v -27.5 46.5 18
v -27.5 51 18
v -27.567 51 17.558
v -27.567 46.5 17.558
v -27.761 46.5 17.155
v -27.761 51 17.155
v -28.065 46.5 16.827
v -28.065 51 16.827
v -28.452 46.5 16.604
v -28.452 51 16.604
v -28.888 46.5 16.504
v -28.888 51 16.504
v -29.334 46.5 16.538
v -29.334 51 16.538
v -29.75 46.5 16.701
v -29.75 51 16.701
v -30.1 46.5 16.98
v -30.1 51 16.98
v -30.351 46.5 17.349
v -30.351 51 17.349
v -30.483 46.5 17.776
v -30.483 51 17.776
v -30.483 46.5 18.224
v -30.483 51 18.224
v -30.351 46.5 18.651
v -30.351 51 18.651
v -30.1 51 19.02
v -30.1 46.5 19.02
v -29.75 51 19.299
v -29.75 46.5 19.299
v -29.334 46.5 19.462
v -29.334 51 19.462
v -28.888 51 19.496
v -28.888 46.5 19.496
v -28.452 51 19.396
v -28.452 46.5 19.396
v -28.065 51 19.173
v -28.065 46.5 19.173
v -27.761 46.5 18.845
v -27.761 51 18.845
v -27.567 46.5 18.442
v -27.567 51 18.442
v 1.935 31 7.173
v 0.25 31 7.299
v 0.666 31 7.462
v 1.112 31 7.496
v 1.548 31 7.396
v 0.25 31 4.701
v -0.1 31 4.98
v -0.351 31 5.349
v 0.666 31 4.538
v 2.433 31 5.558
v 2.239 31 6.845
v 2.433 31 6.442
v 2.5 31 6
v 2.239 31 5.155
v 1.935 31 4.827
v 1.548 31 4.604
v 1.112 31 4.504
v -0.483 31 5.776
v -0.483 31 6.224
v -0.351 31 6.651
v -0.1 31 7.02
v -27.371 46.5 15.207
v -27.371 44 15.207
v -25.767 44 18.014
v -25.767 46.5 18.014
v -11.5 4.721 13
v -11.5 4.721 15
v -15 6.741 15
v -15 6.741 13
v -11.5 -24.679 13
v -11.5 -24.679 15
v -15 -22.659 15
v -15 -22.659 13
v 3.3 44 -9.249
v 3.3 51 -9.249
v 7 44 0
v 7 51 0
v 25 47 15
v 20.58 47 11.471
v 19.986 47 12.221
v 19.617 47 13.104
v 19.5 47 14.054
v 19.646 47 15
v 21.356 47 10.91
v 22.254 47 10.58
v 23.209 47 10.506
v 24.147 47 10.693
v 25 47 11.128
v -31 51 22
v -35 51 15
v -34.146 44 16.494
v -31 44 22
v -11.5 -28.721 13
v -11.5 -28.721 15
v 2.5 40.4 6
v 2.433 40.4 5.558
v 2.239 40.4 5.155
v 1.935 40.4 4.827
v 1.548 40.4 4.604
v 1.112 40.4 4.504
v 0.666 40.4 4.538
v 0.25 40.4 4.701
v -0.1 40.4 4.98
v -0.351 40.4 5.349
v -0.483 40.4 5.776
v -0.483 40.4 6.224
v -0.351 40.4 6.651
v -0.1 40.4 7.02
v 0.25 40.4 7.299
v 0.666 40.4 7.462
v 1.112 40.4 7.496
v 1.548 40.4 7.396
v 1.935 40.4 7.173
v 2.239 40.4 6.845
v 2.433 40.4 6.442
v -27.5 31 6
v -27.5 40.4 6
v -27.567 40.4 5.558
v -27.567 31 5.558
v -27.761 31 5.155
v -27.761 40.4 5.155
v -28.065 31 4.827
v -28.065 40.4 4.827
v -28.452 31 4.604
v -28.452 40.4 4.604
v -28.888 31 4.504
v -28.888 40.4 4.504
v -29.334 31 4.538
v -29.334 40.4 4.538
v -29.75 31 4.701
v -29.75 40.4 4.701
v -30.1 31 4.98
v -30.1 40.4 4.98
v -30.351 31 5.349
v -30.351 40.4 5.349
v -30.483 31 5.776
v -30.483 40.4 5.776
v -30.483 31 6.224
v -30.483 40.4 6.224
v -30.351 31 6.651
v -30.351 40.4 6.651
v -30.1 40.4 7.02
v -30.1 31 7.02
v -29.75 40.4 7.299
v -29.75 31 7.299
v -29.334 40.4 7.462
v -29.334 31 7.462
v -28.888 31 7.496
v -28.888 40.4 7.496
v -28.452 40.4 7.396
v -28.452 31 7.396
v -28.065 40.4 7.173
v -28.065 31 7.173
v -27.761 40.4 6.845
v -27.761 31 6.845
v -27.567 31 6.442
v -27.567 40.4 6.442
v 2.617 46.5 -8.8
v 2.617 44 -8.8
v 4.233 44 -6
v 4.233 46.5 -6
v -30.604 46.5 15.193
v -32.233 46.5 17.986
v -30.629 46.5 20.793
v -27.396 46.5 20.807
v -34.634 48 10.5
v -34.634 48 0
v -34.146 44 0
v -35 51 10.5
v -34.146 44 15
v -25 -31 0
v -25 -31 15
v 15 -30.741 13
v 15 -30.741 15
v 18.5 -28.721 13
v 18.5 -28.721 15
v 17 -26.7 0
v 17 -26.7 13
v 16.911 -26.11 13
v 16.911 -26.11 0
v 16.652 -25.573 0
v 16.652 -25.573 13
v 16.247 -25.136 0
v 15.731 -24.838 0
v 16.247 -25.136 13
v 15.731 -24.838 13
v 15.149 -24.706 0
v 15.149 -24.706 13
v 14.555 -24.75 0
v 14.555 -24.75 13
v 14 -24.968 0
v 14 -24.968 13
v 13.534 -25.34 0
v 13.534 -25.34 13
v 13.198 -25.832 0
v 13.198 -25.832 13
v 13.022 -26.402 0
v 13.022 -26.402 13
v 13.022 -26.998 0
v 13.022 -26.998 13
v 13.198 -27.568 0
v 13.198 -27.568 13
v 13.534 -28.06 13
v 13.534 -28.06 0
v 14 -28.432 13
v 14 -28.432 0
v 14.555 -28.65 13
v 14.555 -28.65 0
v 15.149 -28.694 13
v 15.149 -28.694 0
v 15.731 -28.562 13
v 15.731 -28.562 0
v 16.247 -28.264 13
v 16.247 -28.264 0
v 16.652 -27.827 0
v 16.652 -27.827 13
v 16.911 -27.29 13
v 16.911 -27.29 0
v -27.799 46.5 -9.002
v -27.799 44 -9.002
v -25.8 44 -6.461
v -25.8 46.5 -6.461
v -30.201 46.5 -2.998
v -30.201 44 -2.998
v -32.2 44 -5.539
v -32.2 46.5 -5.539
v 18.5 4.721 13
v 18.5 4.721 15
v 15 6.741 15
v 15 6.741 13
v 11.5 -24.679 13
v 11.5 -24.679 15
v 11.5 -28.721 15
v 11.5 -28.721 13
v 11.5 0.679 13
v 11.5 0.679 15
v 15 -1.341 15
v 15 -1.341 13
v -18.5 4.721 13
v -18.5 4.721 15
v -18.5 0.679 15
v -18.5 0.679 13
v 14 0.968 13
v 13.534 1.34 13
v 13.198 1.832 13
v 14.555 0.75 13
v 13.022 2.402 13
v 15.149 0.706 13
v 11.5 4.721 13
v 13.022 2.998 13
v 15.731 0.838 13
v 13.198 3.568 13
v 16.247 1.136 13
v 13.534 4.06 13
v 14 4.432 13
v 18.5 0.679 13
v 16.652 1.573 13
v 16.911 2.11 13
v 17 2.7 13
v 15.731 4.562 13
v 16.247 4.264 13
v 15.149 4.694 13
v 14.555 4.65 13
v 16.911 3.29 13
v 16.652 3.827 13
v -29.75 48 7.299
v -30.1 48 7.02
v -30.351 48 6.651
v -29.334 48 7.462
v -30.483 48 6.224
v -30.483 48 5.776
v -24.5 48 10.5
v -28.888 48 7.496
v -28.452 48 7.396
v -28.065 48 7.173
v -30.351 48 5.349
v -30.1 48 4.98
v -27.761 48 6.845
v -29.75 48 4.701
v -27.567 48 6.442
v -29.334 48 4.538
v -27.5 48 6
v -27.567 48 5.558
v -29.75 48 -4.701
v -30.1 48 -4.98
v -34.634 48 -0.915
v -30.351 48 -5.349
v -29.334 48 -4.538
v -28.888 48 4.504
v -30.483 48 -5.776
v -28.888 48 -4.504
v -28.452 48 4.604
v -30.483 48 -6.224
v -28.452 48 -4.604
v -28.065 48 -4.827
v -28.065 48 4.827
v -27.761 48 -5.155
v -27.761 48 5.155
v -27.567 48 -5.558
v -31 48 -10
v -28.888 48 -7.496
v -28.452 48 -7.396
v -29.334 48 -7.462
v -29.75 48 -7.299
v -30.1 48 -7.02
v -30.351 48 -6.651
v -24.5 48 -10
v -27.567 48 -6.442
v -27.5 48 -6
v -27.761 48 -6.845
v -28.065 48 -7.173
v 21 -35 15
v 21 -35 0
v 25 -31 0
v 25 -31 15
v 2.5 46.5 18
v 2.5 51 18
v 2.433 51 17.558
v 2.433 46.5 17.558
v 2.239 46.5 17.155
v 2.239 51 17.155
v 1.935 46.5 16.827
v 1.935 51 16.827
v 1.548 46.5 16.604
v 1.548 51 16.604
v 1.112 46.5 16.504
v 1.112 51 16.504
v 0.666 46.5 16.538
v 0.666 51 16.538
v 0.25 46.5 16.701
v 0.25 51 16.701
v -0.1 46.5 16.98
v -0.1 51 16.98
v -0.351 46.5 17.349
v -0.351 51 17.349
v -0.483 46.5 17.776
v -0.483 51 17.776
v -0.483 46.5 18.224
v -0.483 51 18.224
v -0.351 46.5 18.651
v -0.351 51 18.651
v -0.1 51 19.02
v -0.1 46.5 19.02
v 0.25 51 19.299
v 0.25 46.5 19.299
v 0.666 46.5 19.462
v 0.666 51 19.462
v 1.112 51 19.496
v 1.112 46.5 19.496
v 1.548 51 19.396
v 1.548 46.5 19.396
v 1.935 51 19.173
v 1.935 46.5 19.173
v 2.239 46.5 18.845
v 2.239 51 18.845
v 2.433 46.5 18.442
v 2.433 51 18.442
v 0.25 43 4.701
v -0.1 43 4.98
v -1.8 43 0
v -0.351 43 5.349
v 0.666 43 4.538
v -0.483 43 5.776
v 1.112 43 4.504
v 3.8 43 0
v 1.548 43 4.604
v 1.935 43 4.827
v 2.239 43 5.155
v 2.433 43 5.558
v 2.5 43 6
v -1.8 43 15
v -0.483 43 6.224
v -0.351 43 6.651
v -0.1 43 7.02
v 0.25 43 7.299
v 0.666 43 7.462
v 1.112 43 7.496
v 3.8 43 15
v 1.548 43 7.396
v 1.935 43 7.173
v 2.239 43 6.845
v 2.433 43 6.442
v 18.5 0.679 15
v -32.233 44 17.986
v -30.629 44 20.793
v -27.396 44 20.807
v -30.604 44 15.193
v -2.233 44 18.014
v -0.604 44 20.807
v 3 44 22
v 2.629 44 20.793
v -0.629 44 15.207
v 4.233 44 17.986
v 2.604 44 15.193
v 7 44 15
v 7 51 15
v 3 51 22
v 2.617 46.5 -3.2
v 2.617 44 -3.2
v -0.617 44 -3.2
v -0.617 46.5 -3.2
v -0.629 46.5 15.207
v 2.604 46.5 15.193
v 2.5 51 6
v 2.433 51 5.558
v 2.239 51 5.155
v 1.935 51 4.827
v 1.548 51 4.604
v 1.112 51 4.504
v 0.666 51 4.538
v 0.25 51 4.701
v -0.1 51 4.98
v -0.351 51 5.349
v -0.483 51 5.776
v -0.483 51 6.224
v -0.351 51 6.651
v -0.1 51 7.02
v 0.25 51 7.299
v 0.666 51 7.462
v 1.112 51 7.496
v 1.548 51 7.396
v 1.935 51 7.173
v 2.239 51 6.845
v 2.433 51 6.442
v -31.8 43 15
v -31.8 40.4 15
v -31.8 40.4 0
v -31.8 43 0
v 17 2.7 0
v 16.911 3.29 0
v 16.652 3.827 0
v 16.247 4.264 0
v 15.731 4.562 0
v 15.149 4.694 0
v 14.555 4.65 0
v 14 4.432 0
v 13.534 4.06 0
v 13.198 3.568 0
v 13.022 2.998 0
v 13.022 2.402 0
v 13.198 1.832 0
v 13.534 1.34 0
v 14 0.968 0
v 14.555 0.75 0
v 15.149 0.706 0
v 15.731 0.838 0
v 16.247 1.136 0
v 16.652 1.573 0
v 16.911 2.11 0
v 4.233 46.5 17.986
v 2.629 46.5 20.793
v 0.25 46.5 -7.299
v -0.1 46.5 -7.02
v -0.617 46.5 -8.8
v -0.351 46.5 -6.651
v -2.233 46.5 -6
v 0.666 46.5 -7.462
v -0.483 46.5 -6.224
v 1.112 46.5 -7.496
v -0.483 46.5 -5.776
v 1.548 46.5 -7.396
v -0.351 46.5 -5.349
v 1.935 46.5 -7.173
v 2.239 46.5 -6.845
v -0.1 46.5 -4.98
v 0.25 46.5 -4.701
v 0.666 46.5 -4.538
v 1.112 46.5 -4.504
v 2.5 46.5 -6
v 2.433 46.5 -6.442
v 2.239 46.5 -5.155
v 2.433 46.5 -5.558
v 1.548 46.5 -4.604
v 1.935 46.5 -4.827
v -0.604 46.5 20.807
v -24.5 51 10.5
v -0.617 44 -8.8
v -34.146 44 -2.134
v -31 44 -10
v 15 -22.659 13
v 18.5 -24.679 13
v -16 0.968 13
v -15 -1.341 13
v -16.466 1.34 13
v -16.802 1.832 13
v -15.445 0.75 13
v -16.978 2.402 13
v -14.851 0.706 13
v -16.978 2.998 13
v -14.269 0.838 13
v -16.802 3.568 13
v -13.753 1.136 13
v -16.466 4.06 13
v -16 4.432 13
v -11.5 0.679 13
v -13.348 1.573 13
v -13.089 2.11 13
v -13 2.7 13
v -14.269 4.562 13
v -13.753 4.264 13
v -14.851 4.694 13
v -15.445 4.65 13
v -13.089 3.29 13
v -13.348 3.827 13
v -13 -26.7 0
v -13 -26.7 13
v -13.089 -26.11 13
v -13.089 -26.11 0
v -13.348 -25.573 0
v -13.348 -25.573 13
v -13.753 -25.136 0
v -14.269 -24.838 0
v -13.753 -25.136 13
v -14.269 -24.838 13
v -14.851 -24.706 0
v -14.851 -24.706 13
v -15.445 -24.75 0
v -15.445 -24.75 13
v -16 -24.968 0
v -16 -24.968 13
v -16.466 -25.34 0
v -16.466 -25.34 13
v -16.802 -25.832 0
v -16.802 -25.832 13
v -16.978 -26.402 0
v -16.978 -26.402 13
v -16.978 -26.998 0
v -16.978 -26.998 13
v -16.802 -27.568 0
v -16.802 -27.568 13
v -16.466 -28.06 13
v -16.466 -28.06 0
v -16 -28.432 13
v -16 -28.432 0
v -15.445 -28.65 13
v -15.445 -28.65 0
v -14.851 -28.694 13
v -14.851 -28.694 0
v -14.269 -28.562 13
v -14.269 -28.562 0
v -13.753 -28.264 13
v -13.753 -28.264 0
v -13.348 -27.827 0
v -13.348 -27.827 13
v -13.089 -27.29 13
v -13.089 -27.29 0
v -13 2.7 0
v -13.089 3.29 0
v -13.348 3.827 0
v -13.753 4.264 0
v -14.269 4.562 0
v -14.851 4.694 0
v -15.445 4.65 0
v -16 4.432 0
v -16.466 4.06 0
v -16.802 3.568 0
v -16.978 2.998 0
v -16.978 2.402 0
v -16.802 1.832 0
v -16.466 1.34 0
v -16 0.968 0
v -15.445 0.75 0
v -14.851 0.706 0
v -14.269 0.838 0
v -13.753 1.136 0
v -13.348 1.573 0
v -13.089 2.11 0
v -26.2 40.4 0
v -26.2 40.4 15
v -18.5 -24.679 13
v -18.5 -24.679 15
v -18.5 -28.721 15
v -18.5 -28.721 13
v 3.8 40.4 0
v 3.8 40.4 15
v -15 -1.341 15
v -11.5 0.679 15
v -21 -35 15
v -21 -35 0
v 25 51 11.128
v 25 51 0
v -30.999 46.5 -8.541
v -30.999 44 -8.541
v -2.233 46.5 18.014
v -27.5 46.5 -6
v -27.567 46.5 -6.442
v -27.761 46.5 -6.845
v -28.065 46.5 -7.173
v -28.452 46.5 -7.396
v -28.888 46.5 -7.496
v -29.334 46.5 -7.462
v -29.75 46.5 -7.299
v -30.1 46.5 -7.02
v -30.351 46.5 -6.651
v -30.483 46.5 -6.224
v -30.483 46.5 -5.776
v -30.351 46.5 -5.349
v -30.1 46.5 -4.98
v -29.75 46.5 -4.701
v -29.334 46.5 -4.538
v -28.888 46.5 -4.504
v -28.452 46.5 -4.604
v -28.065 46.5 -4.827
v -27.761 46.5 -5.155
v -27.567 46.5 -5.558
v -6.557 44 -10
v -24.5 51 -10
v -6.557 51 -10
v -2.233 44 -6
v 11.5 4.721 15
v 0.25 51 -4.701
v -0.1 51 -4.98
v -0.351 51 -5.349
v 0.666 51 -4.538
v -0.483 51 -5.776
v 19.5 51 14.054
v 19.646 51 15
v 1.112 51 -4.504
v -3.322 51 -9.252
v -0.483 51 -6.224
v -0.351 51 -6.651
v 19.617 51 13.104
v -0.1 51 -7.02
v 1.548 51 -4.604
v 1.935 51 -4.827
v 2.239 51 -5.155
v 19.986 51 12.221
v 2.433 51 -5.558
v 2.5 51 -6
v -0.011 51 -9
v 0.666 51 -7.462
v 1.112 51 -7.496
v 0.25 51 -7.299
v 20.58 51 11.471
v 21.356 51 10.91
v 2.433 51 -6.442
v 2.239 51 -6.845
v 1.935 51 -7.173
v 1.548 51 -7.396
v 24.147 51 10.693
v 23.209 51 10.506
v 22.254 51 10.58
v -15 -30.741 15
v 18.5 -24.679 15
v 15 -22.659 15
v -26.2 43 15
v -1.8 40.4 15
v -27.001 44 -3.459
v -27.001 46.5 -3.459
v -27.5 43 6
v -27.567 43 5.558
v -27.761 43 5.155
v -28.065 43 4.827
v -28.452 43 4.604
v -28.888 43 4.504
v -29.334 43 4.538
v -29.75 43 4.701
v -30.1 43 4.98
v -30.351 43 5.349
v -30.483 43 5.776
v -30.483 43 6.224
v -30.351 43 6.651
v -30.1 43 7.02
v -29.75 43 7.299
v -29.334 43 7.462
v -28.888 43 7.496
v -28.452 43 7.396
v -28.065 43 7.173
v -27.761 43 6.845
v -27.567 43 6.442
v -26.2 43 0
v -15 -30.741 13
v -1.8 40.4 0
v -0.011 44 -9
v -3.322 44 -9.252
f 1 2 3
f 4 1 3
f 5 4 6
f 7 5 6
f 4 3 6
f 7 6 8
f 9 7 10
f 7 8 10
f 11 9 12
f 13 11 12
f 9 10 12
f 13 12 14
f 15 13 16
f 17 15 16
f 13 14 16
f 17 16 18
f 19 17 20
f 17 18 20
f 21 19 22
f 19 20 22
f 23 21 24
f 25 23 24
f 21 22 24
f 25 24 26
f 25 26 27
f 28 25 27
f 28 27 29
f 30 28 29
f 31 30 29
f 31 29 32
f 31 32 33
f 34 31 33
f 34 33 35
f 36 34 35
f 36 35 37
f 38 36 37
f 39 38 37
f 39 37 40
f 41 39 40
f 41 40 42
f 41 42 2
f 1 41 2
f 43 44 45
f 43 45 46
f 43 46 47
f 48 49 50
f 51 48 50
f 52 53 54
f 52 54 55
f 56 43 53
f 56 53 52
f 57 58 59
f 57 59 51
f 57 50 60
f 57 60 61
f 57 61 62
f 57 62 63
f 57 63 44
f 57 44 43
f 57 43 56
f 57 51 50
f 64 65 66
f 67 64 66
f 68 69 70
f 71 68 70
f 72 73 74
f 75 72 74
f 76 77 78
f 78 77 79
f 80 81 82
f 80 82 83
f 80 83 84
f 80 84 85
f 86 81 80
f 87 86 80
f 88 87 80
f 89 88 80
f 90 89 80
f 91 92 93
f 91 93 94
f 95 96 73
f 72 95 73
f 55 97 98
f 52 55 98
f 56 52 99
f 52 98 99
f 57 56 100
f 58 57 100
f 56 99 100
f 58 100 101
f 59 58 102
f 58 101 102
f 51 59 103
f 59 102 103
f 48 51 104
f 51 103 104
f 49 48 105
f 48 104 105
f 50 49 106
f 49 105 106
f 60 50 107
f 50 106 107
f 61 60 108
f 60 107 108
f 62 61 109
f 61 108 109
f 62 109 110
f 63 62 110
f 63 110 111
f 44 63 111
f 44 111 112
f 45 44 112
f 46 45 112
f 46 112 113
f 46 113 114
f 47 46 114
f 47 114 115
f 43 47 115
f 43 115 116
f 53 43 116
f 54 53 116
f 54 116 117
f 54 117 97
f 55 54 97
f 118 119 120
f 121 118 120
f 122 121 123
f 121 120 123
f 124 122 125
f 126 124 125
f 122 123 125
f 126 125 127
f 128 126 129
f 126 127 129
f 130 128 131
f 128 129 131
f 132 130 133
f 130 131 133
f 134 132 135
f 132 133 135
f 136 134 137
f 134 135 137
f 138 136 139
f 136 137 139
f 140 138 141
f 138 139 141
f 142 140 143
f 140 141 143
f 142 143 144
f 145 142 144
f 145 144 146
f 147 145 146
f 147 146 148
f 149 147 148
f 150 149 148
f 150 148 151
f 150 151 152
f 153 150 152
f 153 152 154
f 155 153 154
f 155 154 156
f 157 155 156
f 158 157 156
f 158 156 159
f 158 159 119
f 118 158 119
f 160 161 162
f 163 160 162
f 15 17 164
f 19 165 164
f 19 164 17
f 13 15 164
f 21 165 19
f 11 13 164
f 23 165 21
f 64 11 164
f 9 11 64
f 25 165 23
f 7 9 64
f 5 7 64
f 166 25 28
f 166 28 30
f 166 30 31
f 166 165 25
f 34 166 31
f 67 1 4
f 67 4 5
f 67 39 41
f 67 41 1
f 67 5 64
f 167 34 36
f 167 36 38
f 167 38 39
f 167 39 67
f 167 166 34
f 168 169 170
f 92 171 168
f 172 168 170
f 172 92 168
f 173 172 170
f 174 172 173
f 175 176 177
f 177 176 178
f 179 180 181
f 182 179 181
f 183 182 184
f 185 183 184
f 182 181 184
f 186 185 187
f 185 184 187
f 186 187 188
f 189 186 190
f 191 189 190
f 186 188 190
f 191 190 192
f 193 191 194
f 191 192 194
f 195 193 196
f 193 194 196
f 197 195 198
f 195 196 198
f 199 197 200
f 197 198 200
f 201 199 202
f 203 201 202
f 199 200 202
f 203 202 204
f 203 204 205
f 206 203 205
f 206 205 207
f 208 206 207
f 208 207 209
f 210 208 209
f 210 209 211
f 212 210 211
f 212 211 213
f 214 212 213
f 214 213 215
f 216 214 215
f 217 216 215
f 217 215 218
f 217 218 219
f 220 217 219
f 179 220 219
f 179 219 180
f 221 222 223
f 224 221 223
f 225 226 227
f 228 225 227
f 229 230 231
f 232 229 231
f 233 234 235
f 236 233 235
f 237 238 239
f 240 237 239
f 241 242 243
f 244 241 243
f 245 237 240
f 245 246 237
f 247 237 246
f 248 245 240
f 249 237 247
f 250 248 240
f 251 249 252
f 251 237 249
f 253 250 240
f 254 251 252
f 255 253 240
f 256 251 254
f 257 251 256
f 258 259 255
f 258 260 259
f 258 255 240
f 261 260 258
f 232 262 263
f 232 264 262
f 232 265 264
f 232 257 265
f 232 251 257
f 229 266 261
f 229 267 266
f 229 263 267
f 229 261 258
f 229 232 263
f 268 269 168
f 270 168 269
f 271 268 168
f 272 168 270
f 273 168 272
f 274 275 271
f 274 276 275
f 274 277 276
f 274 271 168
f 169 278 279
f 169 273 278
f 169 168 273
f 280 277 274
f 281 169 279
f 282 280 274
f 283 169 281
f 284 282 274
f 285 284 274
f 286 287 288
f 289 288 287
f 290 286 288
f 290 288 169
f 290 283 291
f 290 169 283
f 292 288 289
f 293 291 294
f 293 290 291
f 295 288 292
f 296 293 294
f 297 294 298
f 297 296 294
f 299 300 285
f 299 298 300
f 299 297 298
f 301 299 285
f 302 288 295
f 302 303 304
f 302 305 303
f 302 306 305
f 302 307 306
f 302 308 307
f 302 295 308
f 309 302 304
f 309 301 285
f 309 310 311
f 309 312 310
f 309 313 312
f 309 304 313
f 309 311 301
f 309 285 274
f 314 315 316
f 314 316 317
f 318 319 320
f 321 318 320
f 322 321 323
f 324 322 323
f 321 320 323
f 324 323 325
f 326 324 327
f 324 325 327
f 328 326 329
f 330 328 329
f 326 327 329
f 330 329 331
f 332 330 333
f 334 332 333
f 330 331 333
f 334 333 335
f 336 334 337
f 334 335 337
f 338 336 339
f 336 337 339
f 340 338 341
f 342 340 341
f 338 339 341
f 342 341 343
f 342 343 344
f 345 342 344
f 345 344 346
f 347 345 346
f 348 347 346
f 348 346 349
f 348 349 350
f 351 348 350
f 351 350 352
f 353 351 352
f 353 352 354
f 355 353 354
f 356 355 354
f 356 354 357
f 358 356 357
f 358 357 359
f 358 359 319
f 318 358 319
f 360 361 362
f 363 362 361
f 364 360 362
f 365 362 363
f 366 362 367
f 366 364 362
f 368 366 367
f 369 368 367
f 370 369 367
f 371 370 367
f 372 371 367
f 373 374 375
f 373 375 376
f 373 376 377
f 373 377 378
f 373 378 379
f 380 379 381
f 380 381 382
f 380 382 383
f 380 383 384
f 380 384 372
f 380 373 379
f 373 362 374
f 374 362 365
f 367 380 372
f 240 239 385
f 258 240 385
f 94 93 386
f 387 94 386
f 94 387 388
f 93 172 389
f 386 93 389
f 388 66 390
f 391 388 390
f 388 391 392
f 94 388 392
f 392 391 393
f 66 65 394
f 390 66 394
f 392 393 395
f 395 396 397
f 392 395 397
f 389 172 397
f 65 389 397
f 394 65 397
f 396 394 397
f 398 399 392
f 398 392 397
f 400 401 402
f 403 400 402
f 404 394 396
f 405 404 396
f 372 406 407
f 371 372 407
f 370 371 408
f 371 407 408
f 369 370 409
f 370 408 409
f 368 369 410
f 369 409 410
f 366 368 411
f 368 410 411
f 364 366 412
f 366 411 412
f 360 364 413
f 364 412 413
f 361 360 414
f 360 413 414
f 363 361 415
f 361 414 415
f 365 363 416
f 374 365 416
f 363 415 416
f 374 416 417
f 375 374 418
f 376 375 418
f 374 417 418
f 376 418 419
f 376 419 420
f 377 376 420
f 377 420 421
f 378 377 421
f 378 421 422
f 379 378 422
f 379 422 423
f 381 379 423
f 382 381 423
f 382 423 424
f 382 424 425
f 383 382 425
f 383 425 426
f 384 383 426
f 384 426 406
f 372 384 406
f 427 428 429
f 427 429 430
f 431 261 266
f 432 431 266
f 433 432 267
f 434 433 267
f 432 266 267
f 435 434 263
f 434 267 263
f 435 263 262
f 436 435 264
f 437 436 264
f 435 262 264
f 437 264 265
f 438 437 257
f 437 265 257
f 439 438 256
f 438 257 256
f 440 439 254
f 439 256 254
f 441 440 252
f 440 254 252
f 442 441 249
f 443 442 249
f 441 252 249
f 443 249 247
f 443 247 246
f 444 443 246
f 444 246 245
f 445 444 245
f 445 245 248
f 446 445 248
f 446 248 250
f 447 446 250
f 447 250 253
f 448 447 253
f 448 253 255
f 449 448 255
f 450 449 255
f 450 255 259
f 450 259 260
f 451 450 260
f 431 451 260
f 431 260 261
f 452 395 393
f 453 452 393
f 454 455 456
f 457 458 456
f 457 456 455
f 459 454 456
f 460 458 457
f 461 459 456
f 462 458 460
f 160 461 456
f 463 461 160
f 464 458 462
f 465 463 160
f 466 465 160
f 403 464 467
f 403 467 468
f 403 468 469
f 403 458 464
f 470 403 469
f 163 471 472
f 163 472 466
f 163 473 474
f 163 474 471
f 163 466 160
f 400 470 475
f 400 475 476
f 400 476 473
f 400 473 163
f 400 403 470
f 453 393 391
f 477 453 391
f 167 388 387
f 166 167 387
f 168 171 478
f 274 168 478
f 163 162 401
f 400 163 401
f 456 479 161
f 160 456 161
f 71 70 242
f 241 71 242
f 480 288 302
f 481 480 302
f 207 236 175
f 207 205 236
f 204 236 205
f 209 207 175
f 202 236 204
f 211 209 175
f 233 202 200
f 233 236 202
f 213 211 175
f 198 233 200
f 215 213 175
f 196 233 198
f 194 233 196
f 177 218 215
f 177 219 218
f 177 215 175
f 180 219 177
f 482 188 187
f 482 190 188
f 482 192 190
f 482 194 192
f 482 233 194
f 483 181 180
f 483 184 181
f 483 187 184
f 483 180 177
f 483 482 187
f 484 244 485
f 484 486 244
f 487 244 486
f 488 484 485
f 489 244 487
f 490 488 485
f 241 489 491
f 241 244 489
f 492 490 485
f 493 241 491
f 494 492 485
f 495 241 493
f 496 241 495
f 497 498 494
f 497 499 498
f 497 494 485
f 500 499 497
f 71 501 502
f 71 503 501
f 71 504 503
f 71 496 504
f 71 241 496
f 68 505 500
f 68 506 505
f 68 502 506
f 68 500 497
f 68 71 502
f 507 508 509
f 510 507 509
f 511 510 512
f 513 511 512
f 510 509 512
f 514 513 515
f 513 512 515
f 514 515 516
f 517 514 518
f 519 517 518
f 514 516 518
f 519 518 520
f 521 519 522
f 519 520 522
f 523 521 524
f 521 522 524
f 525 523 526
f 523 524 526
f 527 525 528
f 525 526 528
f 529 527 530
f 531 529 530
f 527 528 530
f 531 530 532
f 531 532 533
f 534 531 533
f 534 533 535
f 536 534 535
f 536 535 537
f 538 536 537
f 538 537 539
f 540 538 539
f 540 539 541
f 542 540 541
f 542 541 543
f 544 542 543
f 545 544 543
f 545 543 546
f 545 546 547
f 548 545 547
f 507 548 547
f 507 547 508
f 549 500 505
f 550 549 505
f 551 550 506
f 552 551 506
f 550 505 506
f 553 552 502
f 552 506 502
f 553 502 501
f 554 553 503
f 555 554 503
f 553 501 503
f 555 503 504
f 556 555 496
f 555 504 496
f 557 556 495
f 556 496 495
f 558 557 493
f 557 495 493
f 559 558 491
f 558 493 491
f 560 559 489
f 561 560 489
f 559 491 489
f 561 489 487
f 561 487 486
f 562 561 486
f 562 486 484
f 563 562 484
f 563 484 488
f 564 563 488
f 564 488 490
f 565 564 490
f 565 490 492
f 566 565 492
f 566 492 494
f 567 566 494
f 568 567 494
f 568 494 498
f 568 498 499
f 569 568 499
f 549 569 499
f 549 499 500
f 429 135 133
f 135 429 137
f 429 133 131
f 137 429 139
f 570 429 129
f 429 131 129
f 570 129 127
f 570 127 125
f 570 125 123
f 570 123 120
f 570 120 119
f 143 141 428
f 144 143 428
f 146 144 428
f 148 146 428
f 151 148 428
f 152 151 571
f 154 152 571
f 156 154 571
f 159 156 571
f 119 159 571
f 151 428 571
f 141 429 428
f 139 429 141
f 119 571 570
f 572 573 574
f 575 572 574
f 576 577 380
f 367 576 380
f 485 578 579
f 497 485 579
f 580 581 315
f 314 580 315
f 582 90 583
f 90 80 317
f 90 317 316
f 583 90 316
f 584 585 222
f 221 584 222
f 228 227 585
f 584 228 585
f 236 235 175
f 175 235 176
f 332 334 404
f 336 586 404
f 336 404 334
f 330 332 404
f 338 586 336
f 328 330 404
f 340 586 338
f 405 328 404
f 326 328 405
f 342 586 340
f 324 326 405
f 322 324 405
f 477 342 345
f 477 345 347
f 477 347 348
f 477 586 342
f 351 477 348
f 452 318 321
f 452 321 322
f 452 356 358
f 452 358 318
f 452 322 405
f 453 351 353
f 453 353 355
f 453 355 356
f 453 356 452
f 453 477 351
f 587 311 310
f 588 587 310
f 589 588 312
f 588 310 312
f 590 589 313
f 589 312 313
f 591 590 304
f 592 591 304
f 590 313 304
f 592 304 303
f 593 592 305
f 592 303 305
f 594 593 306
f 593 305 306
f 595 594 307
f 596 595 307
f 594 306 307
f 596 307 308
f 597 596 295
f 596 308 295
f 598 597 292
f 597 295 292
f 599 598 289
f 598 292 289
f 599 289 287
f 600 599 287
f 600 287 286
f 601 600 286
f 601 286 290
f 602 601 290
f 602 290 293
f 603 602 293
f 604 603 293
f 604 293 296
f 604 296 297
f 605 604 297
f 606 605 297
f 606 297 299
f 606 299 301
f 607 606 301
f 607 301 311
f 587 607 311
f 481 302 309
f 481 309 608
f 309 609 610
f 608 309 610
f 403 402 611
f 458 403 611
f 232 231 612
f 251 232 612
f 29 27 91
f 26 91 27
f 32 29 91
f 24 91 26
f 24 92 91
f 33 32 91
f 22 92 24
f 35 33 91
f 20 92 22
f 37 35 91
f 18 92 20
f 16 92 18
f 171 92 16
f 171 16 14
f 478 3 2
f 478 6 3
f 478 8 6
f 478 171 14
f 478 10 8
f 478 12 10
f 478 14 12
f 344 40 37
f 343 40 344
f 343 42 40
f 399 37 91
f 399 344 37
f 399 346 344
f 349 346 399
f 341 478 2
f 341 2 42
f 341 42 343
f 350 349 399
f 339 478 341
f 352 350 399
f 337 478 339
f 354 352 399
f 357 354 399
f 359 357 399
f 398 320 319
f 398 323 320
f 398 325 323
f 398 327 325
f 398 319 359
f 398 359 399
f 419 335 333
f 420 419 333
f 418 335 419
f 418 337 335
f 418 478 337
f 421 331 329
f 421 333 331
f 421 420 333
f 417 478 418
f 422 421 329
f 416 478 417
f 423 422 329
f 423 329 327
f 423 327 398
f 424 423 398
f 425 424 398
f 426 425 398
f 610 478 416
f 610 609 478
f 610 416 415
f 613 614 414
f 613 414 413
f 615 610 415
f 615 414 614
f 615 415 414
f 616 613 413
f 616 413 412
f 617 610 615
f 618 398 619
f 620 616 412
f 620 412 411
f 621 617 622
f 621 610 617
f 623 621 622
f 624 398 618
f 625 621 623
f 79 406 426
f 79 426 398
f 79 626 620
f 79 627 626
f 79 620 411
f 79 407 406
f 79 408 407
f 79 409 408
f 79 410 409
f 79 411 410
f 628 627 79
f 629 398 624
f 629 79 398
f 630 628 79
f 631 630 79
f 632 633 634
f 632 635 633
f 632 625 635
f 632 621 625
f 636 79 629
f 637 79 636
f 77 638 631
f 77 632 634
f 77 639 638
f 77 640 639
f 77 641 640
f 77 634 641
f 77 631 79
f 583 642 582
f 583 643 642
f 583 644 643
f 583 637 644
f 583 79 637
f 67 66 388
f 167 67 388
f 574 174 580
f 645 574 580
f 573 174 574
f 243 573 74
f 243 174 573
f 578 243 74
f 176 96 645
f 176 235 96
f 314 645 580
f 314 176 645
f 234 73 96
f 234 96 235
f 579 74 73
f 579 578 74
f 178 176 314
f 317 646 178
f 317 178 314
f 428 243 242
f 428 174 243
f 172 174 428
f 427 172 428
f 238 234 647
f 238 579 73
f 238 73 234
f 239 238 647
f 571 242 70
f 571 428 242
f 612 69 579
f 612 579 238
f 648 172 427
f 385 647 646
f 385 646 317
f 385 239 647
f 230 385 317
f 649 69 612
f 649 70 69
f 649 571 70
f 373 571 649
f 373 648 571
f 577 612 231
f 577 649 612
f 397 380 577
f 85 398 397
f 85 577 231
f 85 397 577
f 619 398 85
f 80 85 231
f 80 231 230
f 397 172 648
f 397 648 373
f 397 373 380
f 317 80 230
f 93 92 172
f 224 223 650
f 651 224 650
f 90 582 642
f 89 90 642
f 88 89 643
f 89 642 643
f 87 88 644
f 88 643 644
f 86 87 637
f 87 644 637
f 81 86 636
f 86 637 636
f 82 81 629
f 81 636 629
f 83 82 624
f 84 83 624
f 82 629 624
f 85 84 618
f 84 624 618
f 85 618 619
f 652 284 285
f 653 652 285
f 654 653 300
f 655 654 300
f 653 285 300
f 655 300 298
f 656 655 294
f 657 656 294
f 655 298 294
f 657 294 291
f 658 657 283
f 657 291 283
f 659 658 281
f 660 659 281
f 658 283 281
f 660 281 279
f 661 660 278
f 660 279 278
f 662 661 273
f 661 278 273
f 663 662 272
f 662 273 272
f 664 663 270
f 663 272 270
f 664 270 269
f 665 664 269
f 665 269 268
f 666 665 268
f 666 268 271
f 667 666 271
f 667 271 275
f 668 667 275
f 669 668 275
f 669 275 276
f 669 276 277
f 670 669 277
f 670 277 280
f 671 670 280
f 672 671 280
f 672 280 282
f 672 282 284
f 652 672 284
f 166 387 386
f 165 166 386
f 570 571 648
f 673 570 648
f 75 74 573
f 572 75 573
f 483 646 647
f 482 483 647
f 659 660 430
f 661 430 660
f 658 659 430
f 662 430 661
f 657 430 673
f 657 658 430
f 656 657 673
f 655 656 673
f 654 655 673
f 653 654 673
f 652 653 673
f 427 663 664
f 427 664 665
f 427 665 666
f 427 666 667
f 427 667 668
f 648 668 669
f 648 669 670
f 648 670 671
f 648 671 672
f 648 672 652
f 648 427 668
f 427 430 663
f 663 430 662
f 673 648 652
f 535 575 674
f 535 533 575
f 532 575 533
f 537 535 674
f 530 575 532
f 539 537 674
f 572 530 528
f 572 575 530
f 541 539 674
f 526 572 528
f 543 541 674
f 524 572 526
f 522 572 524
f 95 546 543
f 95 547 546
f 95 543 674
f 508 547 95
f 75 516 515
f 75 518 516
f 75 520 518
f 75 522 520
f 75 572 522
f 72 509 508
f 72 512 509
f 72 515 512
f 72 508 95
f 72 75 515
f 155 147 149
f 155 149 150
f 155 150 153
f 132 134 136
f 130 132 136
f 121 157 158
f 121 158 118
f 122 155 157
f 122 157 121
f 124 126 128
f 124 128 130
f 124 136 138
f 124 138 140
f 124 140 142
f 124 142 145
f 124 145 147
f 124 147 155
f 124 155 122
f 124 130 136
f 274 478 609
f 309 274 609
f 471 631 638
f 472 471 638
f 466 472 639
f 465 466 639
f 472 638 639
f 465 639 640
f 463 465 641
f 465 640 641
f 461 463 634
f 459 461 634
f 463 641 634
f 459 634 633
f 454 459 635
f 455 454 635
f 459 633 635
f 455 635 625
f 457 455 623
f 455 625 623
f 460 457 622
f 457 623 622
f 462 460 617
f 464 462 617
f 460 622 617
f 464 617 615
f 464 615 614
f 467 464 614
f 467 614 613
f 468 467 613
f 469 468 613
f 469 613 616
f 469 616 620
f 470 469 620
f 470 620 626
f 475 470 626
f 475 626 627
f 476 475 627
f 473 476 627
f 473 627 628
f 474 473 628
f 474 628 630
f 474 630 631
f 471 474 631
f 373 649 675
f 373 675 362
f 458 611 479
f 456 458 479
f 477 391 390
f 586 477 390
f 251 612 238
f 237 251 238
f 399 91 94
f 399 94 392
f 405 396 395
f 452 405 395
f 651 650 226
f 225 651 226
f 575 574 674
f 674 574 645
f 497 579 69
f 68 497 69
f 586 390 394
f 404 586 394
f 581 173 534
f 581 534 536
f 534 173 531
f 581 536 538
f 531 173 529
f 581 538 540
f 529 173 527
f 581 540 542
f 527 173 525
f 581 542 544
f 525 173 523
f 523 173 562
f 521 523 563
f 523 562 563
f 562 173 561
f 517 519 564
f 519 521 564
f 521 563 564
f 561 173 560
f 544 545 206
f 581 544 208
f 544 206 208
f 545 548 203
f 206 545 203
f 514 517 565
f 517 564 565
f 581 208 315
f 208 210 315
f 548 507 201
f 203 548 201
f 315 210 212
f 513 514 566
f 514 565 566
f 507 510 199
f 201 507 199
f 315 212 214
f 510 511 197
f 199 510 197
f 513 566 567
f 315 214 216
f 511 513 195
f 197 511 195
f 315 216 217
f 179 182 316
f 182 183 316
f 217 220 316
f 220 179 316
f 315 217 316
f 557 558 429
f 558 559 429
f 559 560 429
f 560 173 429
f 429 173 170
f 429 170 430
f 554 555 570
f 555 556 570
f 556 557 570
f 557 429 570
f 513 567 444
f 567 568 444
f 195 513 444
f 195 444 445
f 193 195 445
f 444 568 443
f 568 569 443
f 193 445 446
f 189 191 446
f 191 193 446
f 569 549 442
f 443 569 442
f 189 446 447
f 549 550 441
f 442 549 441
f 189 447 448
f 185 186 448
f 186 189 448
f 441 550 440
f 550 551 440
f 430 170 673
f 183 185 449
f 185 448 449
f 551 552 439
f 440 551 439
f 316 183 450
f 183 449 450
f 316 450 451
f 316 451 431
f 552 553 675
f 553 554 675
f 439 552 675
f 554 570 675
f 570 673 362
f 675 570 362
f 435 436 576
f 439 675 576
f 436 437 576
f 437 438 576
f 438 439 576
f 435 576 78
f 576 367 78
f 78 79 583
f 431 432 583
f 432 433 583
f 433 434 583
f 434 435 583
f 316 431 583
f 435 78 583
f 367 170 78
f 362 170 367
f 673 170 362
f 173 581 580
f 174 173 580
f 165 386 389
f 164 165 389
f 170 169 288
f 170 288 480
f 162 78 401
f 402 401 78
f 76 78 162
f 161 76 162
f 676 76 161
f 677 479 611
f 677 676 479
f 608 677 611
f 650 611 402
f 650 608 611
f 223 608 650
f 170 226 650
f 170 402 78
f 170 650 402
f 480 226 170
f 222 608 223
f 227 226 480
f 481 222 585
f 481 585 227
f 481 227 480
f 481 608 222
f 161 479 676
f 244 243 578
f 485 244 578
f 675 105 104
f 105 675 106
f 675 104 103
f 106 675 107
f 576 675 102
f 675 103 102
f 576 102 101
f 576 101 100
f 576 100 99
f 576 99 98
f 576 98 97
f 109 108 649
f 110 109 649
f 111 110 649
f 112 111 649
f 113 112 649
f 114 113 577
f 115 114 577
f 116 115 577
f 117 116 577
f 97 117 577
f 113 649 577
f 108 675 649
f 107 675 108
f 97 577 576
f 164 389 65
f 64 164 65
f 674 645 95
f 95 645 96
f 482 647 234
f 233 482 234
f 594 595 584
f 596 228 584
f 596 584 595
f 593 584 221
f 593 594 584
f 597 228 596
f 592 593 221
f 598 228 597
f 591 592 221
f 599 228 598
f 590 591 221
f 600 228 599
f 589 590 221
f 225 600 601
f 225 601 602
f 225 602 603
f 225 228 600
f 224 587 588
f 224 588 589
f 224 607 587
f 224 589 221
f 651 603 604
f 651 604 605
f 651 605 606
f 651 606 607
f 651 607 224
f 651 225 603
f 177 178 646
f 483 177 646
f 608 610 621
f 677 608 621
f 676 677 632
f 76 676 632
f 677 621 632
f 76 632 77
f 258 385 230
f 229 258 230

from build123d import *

# Parameters (mm, degrees)
SKETCH1_W               = 50
SKETCH1_H               = 70
BOSS_EXTRUDE1_DEPTH     = 15
SKETCH3_R               = 2
CUT_EXTRUDE1_DEPTH      = 16
SKETCH4_W               = 50
SKETCH4_H               = 15
BOSS_EXTRUDE2_DEPTH     = 16
CHAMFER1_SIZE           = 4
BOSS_EXTRUDE3_DEPTH     = 15
SKETCH6_R               = 3.5
CUT_EXTRUDE2_DEPTH      = 4
SKETCH7_R               = 1.5
BOSS_EXTRUDE4_DEPTH     = 7
CUT_EXTRUDE3_DEPTH      = 8
CUT_EXTRUDE3_DEPTH_BACK = 26
SKETCH7_2_R             = 1.5
CUT_EXTRUDE4_DEPTH      = 20
SKETCH9_W               = 5.6
SKETCH9_H               = 2.6
CUT_EXTRUDE5_DEPTH      = 26
SKETCH10_W              = 10.5
SKETCH10_H              = 20.5
CUT_EXTRUDE6_DEPTH      = 3
CUT_EXTRUDE7_DEPTH      = 2.5
CUT_EXTRUDE8_DEPTH      = 2
SKETCH14_R              = 22
CUT_EXTRUDE9_DEPTH      = 87


with BuildPart() as part:
    # Sketch1 → Boss-Extrude1 (new body)
    with BuildSketch(Plane.XY):
        Rectangle(SKETCH1_W, SKETCH1_H)
    extrude(amount=BOSS_EXTRUDE1_DEPTH)

    # Sketch3 → Cut-Extrude1 (cut, through all)
    with BuildSketch(Plane.XY.offset(15)):
        with Locations((-15, 2.7)):
            Circle(SKETCH3_R)
        with Locations((15, 2.7)):
            Circle(SKETCH3_R)
        with Locations((-15, -26.7)):
            Circle(SKETCH3_R)
        with Locations((15, -26.7)):
            Circle(SKETCH3_R)
    extrude(amount=-CUT_EXTRUDE1_DEPTH, mode=Mode.SUBTRACT)

    # Sketch4 → Boss-Extrude2 (add)
    with BuildSketch(Plane(origin=(0, 35, 0), x_dir=(1, 0, 0), z_dir=(0, 1, 0))):
        with Locations((0, -7.5)):
            Rectangle(SKETCH4_W, SKETCH4_H)
    extrude(amount=BOSS_EXTRUDE2_DEPTH)

    # Chamfer1
    chamfer1_edges = [part.edges().sort_by_distance(p)[0] for p in [
        (25, -35, 7.5),
        (-25, -35, 7.5),
    ]]
    chamfer(chamfer1_edges, length=CHAMFER1_SIZE)

    # Sketch5 → Boss-Extrude3 (add)
    with BuildSketch(Plane.XY.offset(15)):
        Polygon((-25, 51), (-35, 51), (-25, -31), align=None)
    extrude(amount=-BOSS_EXTRUDE3_DEPTH)

    # Sketch6 → Cut-Extrude2 (cut)
    with BuildSketch(Plane(origin=(0, 51, 0), x_dir=(1, 0, 0), z_dir=(0, 1, 0))):
        with Locations((23, -14)):
            Circle(SKETCH6_R)
    extrude(amount=-CUT_EXTRUDE2_DEPTH, mode=Mode.SUBTRACT)

    # Sketch7 → Boss-Extrude4 (add)
    with BuildSketch(Plane(origin=(0, 51, 0), x_dir=(1, 0, 0), z_dir=(0, 1, 0))):
        with Locations((-29, -6)):
            Circle(SKETCH7_R)
        with Locations((1, -6)):
            Circle(SKETCH7_R)
        Polygon((-35, -15), (-31, -22), (3, -22), (7, -15), align=None)
        with Locations((-29, -18)):
            Circle(SKETCH7_R, mode=Mode.SUBTRACT)
        with Locations((1, -18)):
            Circle(SKETCH7_R, mode=Mode.SUBTRACT)
        Polygon((-35, 0), (-31, 10), (3, 10), (7, 0), align=None)
        with Locations((-29, 6)):
            Circle(SKETCH7_R, mode=Mode.SUBTRACT)
        with Locations((1, 6)):
            Circle(SKETCH7_R, mode=Mode.SUBTRACT)
    extrude(amount=-BOSS_EXTRUDE4_DEPTH)

    # Sketch8 → Cut-Extrude3 (cut, two sides)
    with BuildSketch(Plane.XY.offset(15)) as cut_extrude3_sk:
        Polygon((-35, 51), (-34.146341463, 44), (-33.909721647, 42.059717507), (-44.503182053, 47.14840404), (-41.913565843, 51), align=None)
    extrude(amount=CUT_EXTRUDE3_DEPTH, mode=Mode.SUBTRACT)
    extrude(cut_extrude3_sk.sketch, amount=-CUT_EXTRUDE3_DEPTH_BACK, mode=Mode.SUBTRACT)

    # Sketch7<2> → Cut-Extrude4 (cut)
    with BuildSketch(Plane(origin=(0, 51, 0), x_dir=(1, 0, 0), z_dir=(0, 1, 0))):
        with Locations((-29, -6)):
            Circle(SKETCH7_2_R)
        with Locations((1, -6)):
            Circle(SKETCH7_2_R)
    extrude(amount=-CUT_EXTRUDE4_DEPTH, mode=Mode.SUBTRACT)

    # Sketch9 → Cut-Extrude5 (cut, through all)
    with BuildSketch(Plane.XY.offset(15)):
        with Locations((-29, 41.7)):
            Rectangle(SKETCH9_W, SKETCH9_H)
        with Locations((1, 41.7)):
            Rectangle(SKETCH9_W, SKETCH9_H)
    extrude(amount=-CUT_EXTRUDE5_DEPTH, mode=Mode.SUBTRACT)

    # Sketch10 → Cut-Extrude6 (cut)
    with BuildSketch(Plane(origin=(0, 51, 0), x_dir=(1, 0, 0), z_dir=(0, 1, 0))):
        with Locations((-29.75, -0.25)):
            Rectangle(SKETCH10_W, SKETCH10_H)
    extrude(amount=-CUT_EXTRUDE6_DEPTH, mode=Mode.SUBTRACT)

    # Sketch11 → Cut-Extrude7 (cut)
    with BuildSketch(Plane.XZ.offset(-44)):
        Polygon((-30.999351715, -8.540851443), (-27.799233961, -9.001915098), (-25.799882246, -6.461063655), (-27.000648285, -3.459148557), (-30.200766039, -2.998084902), (-32.200117754, -5.538936345), align=None)
        Polygon((2.616580754, -8.8), (4.233161507, -6), (2.616580754, -3.2), (-0.616580754, -3.2), (-2.233161507, -6), (-0.616580754, -8.8), align=None)
        Polygon((-32.233129457, 17.985603874), (-30.604097318, 15.192829694), (-27.370967861, 15.207225819), (-25.766870543, 18.014396126), (-27.395902682, 20.807170306), (-30.629032139, 20.792774181), align=None)
        Polygon((2.629032139, 20.792774181), (-0.604097318, 20.807170306), (-2.233129457, 18.014396126), (-0.629032139, 15.207225819), (2.604097318, 15.192829694), (4.233129457, 17.985603874), align=None)
    extrude(amount=-CUT_EXTRUDE7_DEPTH, mode=Mode.SUBTRACT)

    # Sketch13 → Cut-Extrude8 (cut)
    with BuildSketch(Plane.XY.offset(15)):
        Polygon((11.5, 0.679274058), (15, -1.341451884), (18.5, 0.679274058), (18.5, 4.720725942), (15, 6.741451884), (11.5, 4.720725942), align=None)
        Polygon((-18.5, -28.720725942), (-15, -30.741451884), (-11.5, -28.720725942), (-11.5, -24.679274058), (-15, -22.658548116), (-18.5, -24.679274058), align=None)
        Polygon((18.5, -28.720725942), (18.5, -24.679274058), (15, -22.658548116), (11.5, -24.679274058), (11.5, -28.720725942), (15, -30.741451884), align=None)
        Polygon((-11.5, 4.720725942), (-15, 6.741451884), (-18.5, 4.720725942), (-18.5, 0.679274058), (-15, -1.341451884), (-11.5, 0.679274058), align=None)
    extrude(amount=-CUT_EXTRUDE8_DEPTH, mode=Mode.SUBTRACT)

    # Sketch14 → Cut-Extrude9 (cut, through all)
    with BuildSketch(Plane(origin=(0, 51, 0), x_dir=(1, 0, 0), z_dir=(0, 1, 0))):
        with Locations((0, 31)):
            Circle(SKETCH14_R)
    extrude(amount=-CUT_EXTRUDE9_DEPTH, mode=Mode.SUBTRACT)


solid = part.part
